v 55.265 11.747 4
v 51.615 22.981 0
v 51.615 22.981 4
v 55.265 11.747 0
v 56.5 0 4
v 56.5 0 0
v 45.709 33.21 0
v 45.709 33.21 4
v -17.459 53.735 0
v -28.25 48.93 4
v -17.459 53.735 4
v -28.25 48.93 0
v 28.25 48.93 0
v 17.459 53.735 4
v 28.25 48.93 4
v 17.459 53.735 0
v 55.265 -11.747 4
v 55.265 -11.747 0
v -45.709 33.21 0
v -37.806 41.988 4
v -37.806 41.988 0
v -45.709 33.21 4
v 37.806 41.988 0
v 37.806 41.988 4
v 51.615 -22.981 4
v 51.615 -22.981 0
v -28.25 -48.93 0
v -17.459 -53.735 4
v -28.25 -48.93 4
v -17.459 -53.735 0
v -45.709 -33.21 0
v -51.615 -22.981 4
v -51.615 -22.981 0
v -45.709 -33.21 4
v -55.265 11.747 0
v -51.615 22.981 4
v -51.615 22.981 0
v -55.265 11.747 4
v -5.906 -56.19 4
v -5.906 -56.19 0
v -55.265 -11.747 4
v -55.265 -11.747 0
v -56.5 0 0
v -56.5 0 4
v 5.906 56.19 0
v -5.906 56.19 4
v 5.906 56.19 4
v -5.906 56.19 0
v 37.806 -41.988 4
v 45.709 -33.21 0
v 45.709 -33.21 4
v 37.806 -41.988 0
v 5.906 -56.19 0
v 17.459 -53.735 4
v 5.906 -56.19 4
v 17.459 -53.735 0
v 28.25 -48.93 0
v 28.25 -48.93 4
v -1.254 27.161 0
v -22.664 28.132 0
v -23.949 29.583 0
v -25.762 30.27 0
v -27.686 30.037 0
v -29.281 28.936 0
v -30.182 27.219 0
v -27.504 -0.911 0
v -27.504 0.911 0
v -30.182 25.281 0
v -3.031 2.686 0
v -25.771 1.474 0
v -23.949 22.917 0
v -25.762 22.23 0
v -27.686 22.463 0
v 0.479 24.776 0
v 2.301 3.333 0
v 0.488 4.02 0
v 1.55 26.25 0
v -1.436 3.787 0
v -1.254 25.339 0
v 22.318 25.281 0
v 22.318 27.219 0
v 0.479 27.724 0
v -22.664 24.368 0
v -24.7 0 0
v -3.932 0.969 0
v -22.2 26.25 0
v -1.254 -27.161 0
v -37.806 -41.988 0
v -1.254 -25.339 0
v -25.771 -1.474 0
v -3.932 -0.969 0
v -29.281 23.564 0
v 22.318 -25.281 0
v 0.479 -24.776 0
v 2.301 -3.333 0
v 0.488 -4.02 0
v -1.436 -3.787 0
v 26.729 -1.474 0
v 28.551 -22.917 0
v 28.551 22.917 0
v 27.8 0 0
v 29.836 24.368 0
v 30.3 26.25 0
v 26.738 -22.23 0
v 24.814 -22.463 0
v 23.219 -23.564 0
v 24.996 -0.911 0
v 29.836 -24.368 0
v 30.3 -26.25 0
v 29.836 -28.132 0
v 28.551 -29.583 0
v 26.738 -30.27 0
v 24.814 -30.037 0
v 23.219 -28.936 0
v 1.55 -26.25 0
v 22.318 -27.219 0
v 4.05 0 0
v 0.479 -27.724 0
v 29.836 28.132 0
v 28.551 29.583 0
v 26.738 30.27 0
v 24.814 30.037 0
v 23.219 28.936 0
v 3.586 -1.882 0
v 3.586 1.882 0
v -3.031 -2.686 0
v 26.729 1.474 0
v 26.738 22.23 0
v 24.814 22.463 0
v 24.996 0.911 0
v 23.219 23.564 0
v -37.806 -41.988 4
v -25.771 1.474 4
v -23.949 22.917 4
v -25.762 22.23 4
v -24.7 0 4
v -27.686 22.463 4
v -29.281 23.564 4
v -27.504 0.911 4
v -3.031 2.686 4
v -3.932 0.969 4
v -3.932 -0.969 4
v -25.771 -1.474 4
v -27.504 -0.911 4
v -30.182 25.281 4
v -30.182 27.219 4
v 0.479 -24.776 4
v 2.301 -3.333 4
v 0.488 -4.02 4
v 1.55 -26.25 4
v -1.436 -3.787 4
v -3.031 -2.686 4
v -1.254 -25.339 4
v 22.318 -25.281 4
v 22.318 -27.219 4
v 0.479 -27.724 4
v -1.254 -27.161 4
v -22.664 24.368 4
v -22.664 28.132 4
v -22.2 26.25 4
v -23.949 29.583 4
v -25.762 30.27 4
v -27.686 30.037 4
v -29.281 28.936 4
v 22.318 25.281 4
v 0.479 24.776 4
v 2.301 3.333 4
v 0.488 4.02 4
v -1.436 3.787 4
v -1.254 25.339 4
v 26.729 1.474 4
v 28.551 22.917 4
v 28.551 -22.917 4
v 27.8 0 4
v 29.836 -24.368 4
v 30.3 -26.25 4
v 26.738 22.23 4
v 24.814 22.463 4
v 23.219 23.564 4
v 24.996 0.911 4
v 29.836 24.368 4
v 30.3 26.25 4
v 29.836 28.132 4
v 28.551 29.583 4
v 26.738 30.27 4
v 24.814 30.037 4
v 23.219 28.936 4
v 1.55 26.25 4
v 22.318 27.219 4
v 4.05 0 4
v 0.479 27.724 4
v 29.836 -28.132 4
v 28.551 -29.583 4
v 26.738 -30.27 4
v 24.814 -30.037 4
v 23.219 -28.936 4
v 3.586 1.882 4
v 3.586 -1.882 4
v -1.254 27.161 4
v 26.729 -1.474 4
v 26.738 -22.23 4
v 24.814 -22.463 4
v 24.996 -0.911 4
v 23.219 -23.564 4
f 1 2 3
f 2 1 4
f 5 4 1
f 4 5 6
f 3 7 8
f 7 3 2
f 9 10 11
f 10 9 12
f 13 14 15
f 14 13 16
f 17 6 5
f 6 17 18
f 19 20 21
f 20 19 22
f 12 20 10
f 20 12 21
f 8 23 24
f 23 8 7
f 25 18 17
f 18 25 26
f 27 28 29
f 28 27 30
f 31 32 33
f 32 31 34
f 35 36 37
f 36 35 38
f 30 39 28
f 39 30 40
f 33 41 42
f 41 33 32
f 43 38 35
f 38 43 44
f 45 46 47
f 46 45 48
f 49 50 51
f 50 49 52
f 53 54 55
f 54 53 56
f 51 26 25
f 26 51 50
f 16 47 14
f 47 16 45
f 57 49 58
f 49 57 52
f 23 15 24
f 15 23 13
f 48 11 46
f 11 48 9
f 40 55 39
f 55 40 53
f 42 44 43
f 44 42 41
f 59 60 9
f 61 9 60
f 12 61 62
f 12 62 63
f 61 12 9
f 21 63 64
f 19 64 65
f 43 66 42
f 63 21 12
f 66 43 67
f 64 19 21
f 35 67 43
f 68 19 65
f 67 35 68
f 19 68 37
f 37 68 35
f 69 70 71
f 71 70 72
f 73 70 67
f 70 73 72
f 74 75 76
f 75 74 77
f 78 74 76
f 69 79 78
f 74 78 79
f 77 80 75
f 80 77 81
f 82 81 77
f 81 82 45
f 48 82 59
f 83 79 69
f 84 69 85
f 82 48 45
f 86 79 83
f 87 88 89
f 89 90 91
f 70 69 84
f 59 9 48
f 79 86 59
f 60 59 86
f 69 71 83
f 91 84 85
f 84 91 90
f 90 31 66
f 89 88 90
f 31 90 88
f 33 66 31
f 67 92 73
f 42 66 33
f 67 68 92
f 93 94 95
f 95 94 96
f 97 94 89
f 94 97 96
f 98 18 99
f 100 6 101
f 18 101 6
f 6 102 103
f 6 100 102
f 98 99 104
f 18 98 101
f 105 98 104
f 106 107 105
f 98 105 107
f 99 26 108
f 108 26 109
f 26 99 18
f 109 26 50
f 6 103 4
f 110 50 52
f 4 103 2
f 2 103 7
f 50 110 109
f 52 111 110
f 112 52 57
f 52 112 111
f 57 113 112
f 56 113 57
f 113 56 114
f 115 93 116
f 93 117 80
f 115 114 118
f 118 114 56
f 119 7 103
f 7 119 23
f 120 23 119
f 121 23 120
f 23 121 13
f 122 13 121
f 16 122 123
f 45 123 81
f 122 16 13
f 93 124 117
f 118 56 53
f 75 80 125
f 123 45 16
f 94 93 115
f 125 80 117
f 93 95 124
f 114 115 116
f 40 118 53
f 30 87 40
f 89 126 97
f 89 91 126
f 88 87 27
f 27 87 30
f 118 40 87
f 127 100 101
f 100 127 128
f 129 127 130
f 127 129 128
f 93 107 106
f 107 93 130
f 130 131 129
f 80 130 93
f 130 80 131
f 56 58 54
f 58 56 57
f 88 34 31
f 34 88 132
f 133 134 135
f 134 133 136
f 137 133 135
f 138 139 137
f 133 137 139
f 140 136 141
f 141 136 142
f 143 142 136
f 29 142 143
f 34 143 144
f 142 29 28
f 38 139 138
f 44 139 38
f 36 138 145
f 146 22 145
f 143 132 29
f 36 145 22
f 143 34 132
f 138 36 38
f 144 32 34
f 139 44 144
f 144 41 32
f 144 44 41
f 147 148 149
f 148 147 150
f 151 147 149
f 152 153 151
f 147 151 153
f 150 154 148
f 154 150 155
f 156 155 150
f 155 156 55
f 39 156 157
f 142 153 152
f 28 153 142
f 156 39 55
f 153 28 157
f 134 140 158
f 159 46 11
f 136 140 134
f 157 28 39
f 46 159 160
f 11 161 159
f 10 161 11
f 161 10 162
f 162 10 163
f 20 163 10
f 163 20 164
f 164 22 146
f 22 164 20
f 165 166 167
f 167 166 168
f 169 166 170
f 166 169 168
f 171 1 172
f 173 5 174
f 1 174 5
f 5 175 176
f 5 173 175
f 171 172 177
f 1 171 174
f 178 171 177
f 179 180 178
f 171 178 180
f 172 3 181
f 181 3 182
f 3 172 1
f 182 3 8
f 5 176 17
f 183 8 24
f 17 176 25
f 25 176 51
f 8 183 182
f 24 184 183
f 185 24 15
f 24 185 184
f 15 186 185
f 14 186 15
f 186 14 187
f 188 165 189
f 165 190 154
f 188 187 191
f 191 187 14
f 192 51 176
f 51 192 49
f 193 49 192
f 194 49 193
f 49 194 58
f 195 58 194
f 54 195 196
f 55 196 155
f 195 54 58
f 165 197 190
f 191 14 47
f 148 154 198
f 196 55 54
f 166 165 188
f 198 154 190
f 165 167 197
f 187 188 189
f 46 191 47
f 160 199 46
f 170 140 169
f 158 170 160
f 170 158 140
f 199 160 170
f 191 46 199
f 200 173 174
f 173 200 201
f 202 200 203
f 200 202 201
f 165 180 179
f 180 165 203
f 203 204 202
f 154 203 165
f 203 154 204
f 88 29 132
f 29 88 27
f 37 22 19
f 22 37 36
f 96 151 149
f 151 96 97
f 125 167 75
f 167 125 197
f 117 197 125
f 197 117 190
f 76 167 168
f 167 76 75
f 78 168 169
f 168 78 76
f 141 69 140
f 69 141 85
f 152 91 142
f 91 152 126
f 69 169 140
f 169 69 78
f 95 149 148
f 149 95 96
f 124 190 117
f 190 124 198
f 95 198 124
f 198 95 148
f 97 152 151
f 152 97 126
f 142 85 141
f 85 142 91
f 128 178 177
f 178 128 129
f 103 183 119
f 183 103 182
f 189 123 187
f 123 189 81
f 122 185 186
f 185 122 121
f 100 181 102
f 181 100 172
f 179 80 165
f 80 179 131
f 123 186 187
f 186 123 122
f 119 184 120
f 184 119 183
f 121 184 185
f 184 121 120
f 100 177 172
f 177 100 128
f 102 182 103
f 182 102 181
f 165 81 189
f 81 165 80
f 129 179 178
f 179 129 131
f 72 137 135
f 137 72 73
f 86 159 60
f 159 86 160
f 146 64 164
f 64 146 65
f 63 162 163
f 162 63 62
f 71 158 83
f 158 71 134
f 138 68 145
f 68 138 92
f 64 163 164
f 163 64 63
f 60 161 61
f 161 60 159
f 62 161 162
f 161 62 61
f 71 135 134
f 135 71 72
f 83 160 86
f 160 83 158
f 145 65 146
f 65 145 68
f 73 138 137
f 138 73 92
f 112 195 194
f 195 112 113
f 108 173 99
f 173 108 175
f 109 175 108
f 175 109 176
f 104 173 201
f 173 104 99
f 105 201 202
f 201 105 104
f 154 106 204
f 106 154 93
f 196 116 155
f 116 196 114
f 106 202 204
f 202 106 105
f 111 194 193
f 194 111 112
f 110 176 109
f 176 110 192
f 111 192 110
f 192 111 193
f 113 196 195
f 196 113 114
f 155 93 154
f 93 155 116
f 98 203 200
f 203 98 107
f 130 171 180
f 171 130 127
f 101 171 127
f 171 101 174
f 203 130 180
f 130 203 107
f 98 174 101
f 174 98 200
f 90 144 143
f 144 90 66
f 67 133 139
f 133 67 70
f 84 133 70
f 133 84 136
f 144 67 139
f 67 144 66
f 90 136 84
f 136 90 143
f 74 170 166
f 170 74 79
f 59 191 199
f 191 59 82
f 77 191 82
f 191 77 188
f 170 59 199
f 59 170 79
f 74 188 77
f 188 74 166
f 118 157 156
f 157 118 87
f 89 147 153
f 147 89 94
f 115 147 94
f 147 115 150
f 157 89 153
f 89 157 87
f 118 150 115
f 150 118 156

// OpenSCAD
echo(version=version());

// units in mm
BASE_WIDTH = 113.0;
BASE_HEIGHT = 53.0;
BASE_WALL = 4.0;
INNER_RIDGE_HEIGHT = 6.0;
INNER_RIDGE_WIDTH = 2.0;

PLATFORM_WIDTH = 100.0;
PLATFORM_HEIGHT = 4.0;

SUPPORT_WIDTH = BASE_WIDTH - INNER_RIDGE_WIDTH * 4;
SUPPORT_HEIGHT = 20.0;

ROD_WIDTH = 8.1; // m8 
ROD_DEPTH = 10.0;
ROD_PLACEMENT = (BASE_WIDTH - INNER_RIDGE_WIDTH * 4) / 4;

BEARING_HEIGHT = 25.0;
BEARING_WIDTH = 15.2;
ROD_SHAFT_HEIGHT = BEARING_HEIGHT;
ROD_SHAFT_WIDTH = BEARING_WIDTH + 4;

STEPPER_ROD_NUT_WIDTH = 13.0;
STEPPER_ROD_HEIGHT = ROD_SHAFT_HEIGHT;
STEPPER_ROD_NUT_WALL = STEPPER_ROD_NUT_WIDTH + 4;

// stepper dims
STEPPER_WIDTH = 42.3;
STEPPER_HEIGHT = 33.0;
STEPPER_SCREW_SPACE = 31.0; 
STEPPER_HALF_SPACE = STEPPER_SCREW_SPACE / 2;
STEPPER_SCREW_SIZE = 3.1; // m3
STEPPER_SHAFT = 7.0;

// top shelf
difference() {
    cylinder(h=PLATFORM_HEIGHT, d=BASE_WIDTH);
    
    // stepper shaft
    cylinder(h=PLATFORM_HEIGHT, d=ROD_WIDTH);
    
    // support rods
    translate([ROD_PLACEMENT, ROD_PLACEMENT, 0])
        cylinder(h=ROD_DEPTH, d=ROD_WIDTH);
    translate([-1 * ROD_PLACEMENT, ROD_PLACEMENT, 0])
        cylinder(h=ROD_DEPTH, d=ROD_WIDTH);
    translate([ROD_PLACEMENT, -1 * ROD_PLACEMENT, 0])
        cylinder(h=ROD_DEPTH, d=ROD_WIDTH);
    
     // bottom/top connections
     translate([ROD_PLACEMENT, 0, 0])
        cylinder(h=PLATFORM_HEIGHT, d=STEPPER_SCREW_SIZE);
     translate([-1 * ROD_PLACEMENT, 0, 0])
        cylinder(h=PLATFORM_HEIGHT, d=STEPPER_SCREW_SIZE);
     translate([0, ROD_PLACEMENT, 0])
        cylinder(h=PLATFORM_HEIGHT, d=STEPPER_SCREW_SIZE);
    translate([0, -1 * ROD_PLACEMENT, 0])
        cylinder(h=PLATFORM_HEIGHT, d=STEPPER_SCREW_SIZE);
}
